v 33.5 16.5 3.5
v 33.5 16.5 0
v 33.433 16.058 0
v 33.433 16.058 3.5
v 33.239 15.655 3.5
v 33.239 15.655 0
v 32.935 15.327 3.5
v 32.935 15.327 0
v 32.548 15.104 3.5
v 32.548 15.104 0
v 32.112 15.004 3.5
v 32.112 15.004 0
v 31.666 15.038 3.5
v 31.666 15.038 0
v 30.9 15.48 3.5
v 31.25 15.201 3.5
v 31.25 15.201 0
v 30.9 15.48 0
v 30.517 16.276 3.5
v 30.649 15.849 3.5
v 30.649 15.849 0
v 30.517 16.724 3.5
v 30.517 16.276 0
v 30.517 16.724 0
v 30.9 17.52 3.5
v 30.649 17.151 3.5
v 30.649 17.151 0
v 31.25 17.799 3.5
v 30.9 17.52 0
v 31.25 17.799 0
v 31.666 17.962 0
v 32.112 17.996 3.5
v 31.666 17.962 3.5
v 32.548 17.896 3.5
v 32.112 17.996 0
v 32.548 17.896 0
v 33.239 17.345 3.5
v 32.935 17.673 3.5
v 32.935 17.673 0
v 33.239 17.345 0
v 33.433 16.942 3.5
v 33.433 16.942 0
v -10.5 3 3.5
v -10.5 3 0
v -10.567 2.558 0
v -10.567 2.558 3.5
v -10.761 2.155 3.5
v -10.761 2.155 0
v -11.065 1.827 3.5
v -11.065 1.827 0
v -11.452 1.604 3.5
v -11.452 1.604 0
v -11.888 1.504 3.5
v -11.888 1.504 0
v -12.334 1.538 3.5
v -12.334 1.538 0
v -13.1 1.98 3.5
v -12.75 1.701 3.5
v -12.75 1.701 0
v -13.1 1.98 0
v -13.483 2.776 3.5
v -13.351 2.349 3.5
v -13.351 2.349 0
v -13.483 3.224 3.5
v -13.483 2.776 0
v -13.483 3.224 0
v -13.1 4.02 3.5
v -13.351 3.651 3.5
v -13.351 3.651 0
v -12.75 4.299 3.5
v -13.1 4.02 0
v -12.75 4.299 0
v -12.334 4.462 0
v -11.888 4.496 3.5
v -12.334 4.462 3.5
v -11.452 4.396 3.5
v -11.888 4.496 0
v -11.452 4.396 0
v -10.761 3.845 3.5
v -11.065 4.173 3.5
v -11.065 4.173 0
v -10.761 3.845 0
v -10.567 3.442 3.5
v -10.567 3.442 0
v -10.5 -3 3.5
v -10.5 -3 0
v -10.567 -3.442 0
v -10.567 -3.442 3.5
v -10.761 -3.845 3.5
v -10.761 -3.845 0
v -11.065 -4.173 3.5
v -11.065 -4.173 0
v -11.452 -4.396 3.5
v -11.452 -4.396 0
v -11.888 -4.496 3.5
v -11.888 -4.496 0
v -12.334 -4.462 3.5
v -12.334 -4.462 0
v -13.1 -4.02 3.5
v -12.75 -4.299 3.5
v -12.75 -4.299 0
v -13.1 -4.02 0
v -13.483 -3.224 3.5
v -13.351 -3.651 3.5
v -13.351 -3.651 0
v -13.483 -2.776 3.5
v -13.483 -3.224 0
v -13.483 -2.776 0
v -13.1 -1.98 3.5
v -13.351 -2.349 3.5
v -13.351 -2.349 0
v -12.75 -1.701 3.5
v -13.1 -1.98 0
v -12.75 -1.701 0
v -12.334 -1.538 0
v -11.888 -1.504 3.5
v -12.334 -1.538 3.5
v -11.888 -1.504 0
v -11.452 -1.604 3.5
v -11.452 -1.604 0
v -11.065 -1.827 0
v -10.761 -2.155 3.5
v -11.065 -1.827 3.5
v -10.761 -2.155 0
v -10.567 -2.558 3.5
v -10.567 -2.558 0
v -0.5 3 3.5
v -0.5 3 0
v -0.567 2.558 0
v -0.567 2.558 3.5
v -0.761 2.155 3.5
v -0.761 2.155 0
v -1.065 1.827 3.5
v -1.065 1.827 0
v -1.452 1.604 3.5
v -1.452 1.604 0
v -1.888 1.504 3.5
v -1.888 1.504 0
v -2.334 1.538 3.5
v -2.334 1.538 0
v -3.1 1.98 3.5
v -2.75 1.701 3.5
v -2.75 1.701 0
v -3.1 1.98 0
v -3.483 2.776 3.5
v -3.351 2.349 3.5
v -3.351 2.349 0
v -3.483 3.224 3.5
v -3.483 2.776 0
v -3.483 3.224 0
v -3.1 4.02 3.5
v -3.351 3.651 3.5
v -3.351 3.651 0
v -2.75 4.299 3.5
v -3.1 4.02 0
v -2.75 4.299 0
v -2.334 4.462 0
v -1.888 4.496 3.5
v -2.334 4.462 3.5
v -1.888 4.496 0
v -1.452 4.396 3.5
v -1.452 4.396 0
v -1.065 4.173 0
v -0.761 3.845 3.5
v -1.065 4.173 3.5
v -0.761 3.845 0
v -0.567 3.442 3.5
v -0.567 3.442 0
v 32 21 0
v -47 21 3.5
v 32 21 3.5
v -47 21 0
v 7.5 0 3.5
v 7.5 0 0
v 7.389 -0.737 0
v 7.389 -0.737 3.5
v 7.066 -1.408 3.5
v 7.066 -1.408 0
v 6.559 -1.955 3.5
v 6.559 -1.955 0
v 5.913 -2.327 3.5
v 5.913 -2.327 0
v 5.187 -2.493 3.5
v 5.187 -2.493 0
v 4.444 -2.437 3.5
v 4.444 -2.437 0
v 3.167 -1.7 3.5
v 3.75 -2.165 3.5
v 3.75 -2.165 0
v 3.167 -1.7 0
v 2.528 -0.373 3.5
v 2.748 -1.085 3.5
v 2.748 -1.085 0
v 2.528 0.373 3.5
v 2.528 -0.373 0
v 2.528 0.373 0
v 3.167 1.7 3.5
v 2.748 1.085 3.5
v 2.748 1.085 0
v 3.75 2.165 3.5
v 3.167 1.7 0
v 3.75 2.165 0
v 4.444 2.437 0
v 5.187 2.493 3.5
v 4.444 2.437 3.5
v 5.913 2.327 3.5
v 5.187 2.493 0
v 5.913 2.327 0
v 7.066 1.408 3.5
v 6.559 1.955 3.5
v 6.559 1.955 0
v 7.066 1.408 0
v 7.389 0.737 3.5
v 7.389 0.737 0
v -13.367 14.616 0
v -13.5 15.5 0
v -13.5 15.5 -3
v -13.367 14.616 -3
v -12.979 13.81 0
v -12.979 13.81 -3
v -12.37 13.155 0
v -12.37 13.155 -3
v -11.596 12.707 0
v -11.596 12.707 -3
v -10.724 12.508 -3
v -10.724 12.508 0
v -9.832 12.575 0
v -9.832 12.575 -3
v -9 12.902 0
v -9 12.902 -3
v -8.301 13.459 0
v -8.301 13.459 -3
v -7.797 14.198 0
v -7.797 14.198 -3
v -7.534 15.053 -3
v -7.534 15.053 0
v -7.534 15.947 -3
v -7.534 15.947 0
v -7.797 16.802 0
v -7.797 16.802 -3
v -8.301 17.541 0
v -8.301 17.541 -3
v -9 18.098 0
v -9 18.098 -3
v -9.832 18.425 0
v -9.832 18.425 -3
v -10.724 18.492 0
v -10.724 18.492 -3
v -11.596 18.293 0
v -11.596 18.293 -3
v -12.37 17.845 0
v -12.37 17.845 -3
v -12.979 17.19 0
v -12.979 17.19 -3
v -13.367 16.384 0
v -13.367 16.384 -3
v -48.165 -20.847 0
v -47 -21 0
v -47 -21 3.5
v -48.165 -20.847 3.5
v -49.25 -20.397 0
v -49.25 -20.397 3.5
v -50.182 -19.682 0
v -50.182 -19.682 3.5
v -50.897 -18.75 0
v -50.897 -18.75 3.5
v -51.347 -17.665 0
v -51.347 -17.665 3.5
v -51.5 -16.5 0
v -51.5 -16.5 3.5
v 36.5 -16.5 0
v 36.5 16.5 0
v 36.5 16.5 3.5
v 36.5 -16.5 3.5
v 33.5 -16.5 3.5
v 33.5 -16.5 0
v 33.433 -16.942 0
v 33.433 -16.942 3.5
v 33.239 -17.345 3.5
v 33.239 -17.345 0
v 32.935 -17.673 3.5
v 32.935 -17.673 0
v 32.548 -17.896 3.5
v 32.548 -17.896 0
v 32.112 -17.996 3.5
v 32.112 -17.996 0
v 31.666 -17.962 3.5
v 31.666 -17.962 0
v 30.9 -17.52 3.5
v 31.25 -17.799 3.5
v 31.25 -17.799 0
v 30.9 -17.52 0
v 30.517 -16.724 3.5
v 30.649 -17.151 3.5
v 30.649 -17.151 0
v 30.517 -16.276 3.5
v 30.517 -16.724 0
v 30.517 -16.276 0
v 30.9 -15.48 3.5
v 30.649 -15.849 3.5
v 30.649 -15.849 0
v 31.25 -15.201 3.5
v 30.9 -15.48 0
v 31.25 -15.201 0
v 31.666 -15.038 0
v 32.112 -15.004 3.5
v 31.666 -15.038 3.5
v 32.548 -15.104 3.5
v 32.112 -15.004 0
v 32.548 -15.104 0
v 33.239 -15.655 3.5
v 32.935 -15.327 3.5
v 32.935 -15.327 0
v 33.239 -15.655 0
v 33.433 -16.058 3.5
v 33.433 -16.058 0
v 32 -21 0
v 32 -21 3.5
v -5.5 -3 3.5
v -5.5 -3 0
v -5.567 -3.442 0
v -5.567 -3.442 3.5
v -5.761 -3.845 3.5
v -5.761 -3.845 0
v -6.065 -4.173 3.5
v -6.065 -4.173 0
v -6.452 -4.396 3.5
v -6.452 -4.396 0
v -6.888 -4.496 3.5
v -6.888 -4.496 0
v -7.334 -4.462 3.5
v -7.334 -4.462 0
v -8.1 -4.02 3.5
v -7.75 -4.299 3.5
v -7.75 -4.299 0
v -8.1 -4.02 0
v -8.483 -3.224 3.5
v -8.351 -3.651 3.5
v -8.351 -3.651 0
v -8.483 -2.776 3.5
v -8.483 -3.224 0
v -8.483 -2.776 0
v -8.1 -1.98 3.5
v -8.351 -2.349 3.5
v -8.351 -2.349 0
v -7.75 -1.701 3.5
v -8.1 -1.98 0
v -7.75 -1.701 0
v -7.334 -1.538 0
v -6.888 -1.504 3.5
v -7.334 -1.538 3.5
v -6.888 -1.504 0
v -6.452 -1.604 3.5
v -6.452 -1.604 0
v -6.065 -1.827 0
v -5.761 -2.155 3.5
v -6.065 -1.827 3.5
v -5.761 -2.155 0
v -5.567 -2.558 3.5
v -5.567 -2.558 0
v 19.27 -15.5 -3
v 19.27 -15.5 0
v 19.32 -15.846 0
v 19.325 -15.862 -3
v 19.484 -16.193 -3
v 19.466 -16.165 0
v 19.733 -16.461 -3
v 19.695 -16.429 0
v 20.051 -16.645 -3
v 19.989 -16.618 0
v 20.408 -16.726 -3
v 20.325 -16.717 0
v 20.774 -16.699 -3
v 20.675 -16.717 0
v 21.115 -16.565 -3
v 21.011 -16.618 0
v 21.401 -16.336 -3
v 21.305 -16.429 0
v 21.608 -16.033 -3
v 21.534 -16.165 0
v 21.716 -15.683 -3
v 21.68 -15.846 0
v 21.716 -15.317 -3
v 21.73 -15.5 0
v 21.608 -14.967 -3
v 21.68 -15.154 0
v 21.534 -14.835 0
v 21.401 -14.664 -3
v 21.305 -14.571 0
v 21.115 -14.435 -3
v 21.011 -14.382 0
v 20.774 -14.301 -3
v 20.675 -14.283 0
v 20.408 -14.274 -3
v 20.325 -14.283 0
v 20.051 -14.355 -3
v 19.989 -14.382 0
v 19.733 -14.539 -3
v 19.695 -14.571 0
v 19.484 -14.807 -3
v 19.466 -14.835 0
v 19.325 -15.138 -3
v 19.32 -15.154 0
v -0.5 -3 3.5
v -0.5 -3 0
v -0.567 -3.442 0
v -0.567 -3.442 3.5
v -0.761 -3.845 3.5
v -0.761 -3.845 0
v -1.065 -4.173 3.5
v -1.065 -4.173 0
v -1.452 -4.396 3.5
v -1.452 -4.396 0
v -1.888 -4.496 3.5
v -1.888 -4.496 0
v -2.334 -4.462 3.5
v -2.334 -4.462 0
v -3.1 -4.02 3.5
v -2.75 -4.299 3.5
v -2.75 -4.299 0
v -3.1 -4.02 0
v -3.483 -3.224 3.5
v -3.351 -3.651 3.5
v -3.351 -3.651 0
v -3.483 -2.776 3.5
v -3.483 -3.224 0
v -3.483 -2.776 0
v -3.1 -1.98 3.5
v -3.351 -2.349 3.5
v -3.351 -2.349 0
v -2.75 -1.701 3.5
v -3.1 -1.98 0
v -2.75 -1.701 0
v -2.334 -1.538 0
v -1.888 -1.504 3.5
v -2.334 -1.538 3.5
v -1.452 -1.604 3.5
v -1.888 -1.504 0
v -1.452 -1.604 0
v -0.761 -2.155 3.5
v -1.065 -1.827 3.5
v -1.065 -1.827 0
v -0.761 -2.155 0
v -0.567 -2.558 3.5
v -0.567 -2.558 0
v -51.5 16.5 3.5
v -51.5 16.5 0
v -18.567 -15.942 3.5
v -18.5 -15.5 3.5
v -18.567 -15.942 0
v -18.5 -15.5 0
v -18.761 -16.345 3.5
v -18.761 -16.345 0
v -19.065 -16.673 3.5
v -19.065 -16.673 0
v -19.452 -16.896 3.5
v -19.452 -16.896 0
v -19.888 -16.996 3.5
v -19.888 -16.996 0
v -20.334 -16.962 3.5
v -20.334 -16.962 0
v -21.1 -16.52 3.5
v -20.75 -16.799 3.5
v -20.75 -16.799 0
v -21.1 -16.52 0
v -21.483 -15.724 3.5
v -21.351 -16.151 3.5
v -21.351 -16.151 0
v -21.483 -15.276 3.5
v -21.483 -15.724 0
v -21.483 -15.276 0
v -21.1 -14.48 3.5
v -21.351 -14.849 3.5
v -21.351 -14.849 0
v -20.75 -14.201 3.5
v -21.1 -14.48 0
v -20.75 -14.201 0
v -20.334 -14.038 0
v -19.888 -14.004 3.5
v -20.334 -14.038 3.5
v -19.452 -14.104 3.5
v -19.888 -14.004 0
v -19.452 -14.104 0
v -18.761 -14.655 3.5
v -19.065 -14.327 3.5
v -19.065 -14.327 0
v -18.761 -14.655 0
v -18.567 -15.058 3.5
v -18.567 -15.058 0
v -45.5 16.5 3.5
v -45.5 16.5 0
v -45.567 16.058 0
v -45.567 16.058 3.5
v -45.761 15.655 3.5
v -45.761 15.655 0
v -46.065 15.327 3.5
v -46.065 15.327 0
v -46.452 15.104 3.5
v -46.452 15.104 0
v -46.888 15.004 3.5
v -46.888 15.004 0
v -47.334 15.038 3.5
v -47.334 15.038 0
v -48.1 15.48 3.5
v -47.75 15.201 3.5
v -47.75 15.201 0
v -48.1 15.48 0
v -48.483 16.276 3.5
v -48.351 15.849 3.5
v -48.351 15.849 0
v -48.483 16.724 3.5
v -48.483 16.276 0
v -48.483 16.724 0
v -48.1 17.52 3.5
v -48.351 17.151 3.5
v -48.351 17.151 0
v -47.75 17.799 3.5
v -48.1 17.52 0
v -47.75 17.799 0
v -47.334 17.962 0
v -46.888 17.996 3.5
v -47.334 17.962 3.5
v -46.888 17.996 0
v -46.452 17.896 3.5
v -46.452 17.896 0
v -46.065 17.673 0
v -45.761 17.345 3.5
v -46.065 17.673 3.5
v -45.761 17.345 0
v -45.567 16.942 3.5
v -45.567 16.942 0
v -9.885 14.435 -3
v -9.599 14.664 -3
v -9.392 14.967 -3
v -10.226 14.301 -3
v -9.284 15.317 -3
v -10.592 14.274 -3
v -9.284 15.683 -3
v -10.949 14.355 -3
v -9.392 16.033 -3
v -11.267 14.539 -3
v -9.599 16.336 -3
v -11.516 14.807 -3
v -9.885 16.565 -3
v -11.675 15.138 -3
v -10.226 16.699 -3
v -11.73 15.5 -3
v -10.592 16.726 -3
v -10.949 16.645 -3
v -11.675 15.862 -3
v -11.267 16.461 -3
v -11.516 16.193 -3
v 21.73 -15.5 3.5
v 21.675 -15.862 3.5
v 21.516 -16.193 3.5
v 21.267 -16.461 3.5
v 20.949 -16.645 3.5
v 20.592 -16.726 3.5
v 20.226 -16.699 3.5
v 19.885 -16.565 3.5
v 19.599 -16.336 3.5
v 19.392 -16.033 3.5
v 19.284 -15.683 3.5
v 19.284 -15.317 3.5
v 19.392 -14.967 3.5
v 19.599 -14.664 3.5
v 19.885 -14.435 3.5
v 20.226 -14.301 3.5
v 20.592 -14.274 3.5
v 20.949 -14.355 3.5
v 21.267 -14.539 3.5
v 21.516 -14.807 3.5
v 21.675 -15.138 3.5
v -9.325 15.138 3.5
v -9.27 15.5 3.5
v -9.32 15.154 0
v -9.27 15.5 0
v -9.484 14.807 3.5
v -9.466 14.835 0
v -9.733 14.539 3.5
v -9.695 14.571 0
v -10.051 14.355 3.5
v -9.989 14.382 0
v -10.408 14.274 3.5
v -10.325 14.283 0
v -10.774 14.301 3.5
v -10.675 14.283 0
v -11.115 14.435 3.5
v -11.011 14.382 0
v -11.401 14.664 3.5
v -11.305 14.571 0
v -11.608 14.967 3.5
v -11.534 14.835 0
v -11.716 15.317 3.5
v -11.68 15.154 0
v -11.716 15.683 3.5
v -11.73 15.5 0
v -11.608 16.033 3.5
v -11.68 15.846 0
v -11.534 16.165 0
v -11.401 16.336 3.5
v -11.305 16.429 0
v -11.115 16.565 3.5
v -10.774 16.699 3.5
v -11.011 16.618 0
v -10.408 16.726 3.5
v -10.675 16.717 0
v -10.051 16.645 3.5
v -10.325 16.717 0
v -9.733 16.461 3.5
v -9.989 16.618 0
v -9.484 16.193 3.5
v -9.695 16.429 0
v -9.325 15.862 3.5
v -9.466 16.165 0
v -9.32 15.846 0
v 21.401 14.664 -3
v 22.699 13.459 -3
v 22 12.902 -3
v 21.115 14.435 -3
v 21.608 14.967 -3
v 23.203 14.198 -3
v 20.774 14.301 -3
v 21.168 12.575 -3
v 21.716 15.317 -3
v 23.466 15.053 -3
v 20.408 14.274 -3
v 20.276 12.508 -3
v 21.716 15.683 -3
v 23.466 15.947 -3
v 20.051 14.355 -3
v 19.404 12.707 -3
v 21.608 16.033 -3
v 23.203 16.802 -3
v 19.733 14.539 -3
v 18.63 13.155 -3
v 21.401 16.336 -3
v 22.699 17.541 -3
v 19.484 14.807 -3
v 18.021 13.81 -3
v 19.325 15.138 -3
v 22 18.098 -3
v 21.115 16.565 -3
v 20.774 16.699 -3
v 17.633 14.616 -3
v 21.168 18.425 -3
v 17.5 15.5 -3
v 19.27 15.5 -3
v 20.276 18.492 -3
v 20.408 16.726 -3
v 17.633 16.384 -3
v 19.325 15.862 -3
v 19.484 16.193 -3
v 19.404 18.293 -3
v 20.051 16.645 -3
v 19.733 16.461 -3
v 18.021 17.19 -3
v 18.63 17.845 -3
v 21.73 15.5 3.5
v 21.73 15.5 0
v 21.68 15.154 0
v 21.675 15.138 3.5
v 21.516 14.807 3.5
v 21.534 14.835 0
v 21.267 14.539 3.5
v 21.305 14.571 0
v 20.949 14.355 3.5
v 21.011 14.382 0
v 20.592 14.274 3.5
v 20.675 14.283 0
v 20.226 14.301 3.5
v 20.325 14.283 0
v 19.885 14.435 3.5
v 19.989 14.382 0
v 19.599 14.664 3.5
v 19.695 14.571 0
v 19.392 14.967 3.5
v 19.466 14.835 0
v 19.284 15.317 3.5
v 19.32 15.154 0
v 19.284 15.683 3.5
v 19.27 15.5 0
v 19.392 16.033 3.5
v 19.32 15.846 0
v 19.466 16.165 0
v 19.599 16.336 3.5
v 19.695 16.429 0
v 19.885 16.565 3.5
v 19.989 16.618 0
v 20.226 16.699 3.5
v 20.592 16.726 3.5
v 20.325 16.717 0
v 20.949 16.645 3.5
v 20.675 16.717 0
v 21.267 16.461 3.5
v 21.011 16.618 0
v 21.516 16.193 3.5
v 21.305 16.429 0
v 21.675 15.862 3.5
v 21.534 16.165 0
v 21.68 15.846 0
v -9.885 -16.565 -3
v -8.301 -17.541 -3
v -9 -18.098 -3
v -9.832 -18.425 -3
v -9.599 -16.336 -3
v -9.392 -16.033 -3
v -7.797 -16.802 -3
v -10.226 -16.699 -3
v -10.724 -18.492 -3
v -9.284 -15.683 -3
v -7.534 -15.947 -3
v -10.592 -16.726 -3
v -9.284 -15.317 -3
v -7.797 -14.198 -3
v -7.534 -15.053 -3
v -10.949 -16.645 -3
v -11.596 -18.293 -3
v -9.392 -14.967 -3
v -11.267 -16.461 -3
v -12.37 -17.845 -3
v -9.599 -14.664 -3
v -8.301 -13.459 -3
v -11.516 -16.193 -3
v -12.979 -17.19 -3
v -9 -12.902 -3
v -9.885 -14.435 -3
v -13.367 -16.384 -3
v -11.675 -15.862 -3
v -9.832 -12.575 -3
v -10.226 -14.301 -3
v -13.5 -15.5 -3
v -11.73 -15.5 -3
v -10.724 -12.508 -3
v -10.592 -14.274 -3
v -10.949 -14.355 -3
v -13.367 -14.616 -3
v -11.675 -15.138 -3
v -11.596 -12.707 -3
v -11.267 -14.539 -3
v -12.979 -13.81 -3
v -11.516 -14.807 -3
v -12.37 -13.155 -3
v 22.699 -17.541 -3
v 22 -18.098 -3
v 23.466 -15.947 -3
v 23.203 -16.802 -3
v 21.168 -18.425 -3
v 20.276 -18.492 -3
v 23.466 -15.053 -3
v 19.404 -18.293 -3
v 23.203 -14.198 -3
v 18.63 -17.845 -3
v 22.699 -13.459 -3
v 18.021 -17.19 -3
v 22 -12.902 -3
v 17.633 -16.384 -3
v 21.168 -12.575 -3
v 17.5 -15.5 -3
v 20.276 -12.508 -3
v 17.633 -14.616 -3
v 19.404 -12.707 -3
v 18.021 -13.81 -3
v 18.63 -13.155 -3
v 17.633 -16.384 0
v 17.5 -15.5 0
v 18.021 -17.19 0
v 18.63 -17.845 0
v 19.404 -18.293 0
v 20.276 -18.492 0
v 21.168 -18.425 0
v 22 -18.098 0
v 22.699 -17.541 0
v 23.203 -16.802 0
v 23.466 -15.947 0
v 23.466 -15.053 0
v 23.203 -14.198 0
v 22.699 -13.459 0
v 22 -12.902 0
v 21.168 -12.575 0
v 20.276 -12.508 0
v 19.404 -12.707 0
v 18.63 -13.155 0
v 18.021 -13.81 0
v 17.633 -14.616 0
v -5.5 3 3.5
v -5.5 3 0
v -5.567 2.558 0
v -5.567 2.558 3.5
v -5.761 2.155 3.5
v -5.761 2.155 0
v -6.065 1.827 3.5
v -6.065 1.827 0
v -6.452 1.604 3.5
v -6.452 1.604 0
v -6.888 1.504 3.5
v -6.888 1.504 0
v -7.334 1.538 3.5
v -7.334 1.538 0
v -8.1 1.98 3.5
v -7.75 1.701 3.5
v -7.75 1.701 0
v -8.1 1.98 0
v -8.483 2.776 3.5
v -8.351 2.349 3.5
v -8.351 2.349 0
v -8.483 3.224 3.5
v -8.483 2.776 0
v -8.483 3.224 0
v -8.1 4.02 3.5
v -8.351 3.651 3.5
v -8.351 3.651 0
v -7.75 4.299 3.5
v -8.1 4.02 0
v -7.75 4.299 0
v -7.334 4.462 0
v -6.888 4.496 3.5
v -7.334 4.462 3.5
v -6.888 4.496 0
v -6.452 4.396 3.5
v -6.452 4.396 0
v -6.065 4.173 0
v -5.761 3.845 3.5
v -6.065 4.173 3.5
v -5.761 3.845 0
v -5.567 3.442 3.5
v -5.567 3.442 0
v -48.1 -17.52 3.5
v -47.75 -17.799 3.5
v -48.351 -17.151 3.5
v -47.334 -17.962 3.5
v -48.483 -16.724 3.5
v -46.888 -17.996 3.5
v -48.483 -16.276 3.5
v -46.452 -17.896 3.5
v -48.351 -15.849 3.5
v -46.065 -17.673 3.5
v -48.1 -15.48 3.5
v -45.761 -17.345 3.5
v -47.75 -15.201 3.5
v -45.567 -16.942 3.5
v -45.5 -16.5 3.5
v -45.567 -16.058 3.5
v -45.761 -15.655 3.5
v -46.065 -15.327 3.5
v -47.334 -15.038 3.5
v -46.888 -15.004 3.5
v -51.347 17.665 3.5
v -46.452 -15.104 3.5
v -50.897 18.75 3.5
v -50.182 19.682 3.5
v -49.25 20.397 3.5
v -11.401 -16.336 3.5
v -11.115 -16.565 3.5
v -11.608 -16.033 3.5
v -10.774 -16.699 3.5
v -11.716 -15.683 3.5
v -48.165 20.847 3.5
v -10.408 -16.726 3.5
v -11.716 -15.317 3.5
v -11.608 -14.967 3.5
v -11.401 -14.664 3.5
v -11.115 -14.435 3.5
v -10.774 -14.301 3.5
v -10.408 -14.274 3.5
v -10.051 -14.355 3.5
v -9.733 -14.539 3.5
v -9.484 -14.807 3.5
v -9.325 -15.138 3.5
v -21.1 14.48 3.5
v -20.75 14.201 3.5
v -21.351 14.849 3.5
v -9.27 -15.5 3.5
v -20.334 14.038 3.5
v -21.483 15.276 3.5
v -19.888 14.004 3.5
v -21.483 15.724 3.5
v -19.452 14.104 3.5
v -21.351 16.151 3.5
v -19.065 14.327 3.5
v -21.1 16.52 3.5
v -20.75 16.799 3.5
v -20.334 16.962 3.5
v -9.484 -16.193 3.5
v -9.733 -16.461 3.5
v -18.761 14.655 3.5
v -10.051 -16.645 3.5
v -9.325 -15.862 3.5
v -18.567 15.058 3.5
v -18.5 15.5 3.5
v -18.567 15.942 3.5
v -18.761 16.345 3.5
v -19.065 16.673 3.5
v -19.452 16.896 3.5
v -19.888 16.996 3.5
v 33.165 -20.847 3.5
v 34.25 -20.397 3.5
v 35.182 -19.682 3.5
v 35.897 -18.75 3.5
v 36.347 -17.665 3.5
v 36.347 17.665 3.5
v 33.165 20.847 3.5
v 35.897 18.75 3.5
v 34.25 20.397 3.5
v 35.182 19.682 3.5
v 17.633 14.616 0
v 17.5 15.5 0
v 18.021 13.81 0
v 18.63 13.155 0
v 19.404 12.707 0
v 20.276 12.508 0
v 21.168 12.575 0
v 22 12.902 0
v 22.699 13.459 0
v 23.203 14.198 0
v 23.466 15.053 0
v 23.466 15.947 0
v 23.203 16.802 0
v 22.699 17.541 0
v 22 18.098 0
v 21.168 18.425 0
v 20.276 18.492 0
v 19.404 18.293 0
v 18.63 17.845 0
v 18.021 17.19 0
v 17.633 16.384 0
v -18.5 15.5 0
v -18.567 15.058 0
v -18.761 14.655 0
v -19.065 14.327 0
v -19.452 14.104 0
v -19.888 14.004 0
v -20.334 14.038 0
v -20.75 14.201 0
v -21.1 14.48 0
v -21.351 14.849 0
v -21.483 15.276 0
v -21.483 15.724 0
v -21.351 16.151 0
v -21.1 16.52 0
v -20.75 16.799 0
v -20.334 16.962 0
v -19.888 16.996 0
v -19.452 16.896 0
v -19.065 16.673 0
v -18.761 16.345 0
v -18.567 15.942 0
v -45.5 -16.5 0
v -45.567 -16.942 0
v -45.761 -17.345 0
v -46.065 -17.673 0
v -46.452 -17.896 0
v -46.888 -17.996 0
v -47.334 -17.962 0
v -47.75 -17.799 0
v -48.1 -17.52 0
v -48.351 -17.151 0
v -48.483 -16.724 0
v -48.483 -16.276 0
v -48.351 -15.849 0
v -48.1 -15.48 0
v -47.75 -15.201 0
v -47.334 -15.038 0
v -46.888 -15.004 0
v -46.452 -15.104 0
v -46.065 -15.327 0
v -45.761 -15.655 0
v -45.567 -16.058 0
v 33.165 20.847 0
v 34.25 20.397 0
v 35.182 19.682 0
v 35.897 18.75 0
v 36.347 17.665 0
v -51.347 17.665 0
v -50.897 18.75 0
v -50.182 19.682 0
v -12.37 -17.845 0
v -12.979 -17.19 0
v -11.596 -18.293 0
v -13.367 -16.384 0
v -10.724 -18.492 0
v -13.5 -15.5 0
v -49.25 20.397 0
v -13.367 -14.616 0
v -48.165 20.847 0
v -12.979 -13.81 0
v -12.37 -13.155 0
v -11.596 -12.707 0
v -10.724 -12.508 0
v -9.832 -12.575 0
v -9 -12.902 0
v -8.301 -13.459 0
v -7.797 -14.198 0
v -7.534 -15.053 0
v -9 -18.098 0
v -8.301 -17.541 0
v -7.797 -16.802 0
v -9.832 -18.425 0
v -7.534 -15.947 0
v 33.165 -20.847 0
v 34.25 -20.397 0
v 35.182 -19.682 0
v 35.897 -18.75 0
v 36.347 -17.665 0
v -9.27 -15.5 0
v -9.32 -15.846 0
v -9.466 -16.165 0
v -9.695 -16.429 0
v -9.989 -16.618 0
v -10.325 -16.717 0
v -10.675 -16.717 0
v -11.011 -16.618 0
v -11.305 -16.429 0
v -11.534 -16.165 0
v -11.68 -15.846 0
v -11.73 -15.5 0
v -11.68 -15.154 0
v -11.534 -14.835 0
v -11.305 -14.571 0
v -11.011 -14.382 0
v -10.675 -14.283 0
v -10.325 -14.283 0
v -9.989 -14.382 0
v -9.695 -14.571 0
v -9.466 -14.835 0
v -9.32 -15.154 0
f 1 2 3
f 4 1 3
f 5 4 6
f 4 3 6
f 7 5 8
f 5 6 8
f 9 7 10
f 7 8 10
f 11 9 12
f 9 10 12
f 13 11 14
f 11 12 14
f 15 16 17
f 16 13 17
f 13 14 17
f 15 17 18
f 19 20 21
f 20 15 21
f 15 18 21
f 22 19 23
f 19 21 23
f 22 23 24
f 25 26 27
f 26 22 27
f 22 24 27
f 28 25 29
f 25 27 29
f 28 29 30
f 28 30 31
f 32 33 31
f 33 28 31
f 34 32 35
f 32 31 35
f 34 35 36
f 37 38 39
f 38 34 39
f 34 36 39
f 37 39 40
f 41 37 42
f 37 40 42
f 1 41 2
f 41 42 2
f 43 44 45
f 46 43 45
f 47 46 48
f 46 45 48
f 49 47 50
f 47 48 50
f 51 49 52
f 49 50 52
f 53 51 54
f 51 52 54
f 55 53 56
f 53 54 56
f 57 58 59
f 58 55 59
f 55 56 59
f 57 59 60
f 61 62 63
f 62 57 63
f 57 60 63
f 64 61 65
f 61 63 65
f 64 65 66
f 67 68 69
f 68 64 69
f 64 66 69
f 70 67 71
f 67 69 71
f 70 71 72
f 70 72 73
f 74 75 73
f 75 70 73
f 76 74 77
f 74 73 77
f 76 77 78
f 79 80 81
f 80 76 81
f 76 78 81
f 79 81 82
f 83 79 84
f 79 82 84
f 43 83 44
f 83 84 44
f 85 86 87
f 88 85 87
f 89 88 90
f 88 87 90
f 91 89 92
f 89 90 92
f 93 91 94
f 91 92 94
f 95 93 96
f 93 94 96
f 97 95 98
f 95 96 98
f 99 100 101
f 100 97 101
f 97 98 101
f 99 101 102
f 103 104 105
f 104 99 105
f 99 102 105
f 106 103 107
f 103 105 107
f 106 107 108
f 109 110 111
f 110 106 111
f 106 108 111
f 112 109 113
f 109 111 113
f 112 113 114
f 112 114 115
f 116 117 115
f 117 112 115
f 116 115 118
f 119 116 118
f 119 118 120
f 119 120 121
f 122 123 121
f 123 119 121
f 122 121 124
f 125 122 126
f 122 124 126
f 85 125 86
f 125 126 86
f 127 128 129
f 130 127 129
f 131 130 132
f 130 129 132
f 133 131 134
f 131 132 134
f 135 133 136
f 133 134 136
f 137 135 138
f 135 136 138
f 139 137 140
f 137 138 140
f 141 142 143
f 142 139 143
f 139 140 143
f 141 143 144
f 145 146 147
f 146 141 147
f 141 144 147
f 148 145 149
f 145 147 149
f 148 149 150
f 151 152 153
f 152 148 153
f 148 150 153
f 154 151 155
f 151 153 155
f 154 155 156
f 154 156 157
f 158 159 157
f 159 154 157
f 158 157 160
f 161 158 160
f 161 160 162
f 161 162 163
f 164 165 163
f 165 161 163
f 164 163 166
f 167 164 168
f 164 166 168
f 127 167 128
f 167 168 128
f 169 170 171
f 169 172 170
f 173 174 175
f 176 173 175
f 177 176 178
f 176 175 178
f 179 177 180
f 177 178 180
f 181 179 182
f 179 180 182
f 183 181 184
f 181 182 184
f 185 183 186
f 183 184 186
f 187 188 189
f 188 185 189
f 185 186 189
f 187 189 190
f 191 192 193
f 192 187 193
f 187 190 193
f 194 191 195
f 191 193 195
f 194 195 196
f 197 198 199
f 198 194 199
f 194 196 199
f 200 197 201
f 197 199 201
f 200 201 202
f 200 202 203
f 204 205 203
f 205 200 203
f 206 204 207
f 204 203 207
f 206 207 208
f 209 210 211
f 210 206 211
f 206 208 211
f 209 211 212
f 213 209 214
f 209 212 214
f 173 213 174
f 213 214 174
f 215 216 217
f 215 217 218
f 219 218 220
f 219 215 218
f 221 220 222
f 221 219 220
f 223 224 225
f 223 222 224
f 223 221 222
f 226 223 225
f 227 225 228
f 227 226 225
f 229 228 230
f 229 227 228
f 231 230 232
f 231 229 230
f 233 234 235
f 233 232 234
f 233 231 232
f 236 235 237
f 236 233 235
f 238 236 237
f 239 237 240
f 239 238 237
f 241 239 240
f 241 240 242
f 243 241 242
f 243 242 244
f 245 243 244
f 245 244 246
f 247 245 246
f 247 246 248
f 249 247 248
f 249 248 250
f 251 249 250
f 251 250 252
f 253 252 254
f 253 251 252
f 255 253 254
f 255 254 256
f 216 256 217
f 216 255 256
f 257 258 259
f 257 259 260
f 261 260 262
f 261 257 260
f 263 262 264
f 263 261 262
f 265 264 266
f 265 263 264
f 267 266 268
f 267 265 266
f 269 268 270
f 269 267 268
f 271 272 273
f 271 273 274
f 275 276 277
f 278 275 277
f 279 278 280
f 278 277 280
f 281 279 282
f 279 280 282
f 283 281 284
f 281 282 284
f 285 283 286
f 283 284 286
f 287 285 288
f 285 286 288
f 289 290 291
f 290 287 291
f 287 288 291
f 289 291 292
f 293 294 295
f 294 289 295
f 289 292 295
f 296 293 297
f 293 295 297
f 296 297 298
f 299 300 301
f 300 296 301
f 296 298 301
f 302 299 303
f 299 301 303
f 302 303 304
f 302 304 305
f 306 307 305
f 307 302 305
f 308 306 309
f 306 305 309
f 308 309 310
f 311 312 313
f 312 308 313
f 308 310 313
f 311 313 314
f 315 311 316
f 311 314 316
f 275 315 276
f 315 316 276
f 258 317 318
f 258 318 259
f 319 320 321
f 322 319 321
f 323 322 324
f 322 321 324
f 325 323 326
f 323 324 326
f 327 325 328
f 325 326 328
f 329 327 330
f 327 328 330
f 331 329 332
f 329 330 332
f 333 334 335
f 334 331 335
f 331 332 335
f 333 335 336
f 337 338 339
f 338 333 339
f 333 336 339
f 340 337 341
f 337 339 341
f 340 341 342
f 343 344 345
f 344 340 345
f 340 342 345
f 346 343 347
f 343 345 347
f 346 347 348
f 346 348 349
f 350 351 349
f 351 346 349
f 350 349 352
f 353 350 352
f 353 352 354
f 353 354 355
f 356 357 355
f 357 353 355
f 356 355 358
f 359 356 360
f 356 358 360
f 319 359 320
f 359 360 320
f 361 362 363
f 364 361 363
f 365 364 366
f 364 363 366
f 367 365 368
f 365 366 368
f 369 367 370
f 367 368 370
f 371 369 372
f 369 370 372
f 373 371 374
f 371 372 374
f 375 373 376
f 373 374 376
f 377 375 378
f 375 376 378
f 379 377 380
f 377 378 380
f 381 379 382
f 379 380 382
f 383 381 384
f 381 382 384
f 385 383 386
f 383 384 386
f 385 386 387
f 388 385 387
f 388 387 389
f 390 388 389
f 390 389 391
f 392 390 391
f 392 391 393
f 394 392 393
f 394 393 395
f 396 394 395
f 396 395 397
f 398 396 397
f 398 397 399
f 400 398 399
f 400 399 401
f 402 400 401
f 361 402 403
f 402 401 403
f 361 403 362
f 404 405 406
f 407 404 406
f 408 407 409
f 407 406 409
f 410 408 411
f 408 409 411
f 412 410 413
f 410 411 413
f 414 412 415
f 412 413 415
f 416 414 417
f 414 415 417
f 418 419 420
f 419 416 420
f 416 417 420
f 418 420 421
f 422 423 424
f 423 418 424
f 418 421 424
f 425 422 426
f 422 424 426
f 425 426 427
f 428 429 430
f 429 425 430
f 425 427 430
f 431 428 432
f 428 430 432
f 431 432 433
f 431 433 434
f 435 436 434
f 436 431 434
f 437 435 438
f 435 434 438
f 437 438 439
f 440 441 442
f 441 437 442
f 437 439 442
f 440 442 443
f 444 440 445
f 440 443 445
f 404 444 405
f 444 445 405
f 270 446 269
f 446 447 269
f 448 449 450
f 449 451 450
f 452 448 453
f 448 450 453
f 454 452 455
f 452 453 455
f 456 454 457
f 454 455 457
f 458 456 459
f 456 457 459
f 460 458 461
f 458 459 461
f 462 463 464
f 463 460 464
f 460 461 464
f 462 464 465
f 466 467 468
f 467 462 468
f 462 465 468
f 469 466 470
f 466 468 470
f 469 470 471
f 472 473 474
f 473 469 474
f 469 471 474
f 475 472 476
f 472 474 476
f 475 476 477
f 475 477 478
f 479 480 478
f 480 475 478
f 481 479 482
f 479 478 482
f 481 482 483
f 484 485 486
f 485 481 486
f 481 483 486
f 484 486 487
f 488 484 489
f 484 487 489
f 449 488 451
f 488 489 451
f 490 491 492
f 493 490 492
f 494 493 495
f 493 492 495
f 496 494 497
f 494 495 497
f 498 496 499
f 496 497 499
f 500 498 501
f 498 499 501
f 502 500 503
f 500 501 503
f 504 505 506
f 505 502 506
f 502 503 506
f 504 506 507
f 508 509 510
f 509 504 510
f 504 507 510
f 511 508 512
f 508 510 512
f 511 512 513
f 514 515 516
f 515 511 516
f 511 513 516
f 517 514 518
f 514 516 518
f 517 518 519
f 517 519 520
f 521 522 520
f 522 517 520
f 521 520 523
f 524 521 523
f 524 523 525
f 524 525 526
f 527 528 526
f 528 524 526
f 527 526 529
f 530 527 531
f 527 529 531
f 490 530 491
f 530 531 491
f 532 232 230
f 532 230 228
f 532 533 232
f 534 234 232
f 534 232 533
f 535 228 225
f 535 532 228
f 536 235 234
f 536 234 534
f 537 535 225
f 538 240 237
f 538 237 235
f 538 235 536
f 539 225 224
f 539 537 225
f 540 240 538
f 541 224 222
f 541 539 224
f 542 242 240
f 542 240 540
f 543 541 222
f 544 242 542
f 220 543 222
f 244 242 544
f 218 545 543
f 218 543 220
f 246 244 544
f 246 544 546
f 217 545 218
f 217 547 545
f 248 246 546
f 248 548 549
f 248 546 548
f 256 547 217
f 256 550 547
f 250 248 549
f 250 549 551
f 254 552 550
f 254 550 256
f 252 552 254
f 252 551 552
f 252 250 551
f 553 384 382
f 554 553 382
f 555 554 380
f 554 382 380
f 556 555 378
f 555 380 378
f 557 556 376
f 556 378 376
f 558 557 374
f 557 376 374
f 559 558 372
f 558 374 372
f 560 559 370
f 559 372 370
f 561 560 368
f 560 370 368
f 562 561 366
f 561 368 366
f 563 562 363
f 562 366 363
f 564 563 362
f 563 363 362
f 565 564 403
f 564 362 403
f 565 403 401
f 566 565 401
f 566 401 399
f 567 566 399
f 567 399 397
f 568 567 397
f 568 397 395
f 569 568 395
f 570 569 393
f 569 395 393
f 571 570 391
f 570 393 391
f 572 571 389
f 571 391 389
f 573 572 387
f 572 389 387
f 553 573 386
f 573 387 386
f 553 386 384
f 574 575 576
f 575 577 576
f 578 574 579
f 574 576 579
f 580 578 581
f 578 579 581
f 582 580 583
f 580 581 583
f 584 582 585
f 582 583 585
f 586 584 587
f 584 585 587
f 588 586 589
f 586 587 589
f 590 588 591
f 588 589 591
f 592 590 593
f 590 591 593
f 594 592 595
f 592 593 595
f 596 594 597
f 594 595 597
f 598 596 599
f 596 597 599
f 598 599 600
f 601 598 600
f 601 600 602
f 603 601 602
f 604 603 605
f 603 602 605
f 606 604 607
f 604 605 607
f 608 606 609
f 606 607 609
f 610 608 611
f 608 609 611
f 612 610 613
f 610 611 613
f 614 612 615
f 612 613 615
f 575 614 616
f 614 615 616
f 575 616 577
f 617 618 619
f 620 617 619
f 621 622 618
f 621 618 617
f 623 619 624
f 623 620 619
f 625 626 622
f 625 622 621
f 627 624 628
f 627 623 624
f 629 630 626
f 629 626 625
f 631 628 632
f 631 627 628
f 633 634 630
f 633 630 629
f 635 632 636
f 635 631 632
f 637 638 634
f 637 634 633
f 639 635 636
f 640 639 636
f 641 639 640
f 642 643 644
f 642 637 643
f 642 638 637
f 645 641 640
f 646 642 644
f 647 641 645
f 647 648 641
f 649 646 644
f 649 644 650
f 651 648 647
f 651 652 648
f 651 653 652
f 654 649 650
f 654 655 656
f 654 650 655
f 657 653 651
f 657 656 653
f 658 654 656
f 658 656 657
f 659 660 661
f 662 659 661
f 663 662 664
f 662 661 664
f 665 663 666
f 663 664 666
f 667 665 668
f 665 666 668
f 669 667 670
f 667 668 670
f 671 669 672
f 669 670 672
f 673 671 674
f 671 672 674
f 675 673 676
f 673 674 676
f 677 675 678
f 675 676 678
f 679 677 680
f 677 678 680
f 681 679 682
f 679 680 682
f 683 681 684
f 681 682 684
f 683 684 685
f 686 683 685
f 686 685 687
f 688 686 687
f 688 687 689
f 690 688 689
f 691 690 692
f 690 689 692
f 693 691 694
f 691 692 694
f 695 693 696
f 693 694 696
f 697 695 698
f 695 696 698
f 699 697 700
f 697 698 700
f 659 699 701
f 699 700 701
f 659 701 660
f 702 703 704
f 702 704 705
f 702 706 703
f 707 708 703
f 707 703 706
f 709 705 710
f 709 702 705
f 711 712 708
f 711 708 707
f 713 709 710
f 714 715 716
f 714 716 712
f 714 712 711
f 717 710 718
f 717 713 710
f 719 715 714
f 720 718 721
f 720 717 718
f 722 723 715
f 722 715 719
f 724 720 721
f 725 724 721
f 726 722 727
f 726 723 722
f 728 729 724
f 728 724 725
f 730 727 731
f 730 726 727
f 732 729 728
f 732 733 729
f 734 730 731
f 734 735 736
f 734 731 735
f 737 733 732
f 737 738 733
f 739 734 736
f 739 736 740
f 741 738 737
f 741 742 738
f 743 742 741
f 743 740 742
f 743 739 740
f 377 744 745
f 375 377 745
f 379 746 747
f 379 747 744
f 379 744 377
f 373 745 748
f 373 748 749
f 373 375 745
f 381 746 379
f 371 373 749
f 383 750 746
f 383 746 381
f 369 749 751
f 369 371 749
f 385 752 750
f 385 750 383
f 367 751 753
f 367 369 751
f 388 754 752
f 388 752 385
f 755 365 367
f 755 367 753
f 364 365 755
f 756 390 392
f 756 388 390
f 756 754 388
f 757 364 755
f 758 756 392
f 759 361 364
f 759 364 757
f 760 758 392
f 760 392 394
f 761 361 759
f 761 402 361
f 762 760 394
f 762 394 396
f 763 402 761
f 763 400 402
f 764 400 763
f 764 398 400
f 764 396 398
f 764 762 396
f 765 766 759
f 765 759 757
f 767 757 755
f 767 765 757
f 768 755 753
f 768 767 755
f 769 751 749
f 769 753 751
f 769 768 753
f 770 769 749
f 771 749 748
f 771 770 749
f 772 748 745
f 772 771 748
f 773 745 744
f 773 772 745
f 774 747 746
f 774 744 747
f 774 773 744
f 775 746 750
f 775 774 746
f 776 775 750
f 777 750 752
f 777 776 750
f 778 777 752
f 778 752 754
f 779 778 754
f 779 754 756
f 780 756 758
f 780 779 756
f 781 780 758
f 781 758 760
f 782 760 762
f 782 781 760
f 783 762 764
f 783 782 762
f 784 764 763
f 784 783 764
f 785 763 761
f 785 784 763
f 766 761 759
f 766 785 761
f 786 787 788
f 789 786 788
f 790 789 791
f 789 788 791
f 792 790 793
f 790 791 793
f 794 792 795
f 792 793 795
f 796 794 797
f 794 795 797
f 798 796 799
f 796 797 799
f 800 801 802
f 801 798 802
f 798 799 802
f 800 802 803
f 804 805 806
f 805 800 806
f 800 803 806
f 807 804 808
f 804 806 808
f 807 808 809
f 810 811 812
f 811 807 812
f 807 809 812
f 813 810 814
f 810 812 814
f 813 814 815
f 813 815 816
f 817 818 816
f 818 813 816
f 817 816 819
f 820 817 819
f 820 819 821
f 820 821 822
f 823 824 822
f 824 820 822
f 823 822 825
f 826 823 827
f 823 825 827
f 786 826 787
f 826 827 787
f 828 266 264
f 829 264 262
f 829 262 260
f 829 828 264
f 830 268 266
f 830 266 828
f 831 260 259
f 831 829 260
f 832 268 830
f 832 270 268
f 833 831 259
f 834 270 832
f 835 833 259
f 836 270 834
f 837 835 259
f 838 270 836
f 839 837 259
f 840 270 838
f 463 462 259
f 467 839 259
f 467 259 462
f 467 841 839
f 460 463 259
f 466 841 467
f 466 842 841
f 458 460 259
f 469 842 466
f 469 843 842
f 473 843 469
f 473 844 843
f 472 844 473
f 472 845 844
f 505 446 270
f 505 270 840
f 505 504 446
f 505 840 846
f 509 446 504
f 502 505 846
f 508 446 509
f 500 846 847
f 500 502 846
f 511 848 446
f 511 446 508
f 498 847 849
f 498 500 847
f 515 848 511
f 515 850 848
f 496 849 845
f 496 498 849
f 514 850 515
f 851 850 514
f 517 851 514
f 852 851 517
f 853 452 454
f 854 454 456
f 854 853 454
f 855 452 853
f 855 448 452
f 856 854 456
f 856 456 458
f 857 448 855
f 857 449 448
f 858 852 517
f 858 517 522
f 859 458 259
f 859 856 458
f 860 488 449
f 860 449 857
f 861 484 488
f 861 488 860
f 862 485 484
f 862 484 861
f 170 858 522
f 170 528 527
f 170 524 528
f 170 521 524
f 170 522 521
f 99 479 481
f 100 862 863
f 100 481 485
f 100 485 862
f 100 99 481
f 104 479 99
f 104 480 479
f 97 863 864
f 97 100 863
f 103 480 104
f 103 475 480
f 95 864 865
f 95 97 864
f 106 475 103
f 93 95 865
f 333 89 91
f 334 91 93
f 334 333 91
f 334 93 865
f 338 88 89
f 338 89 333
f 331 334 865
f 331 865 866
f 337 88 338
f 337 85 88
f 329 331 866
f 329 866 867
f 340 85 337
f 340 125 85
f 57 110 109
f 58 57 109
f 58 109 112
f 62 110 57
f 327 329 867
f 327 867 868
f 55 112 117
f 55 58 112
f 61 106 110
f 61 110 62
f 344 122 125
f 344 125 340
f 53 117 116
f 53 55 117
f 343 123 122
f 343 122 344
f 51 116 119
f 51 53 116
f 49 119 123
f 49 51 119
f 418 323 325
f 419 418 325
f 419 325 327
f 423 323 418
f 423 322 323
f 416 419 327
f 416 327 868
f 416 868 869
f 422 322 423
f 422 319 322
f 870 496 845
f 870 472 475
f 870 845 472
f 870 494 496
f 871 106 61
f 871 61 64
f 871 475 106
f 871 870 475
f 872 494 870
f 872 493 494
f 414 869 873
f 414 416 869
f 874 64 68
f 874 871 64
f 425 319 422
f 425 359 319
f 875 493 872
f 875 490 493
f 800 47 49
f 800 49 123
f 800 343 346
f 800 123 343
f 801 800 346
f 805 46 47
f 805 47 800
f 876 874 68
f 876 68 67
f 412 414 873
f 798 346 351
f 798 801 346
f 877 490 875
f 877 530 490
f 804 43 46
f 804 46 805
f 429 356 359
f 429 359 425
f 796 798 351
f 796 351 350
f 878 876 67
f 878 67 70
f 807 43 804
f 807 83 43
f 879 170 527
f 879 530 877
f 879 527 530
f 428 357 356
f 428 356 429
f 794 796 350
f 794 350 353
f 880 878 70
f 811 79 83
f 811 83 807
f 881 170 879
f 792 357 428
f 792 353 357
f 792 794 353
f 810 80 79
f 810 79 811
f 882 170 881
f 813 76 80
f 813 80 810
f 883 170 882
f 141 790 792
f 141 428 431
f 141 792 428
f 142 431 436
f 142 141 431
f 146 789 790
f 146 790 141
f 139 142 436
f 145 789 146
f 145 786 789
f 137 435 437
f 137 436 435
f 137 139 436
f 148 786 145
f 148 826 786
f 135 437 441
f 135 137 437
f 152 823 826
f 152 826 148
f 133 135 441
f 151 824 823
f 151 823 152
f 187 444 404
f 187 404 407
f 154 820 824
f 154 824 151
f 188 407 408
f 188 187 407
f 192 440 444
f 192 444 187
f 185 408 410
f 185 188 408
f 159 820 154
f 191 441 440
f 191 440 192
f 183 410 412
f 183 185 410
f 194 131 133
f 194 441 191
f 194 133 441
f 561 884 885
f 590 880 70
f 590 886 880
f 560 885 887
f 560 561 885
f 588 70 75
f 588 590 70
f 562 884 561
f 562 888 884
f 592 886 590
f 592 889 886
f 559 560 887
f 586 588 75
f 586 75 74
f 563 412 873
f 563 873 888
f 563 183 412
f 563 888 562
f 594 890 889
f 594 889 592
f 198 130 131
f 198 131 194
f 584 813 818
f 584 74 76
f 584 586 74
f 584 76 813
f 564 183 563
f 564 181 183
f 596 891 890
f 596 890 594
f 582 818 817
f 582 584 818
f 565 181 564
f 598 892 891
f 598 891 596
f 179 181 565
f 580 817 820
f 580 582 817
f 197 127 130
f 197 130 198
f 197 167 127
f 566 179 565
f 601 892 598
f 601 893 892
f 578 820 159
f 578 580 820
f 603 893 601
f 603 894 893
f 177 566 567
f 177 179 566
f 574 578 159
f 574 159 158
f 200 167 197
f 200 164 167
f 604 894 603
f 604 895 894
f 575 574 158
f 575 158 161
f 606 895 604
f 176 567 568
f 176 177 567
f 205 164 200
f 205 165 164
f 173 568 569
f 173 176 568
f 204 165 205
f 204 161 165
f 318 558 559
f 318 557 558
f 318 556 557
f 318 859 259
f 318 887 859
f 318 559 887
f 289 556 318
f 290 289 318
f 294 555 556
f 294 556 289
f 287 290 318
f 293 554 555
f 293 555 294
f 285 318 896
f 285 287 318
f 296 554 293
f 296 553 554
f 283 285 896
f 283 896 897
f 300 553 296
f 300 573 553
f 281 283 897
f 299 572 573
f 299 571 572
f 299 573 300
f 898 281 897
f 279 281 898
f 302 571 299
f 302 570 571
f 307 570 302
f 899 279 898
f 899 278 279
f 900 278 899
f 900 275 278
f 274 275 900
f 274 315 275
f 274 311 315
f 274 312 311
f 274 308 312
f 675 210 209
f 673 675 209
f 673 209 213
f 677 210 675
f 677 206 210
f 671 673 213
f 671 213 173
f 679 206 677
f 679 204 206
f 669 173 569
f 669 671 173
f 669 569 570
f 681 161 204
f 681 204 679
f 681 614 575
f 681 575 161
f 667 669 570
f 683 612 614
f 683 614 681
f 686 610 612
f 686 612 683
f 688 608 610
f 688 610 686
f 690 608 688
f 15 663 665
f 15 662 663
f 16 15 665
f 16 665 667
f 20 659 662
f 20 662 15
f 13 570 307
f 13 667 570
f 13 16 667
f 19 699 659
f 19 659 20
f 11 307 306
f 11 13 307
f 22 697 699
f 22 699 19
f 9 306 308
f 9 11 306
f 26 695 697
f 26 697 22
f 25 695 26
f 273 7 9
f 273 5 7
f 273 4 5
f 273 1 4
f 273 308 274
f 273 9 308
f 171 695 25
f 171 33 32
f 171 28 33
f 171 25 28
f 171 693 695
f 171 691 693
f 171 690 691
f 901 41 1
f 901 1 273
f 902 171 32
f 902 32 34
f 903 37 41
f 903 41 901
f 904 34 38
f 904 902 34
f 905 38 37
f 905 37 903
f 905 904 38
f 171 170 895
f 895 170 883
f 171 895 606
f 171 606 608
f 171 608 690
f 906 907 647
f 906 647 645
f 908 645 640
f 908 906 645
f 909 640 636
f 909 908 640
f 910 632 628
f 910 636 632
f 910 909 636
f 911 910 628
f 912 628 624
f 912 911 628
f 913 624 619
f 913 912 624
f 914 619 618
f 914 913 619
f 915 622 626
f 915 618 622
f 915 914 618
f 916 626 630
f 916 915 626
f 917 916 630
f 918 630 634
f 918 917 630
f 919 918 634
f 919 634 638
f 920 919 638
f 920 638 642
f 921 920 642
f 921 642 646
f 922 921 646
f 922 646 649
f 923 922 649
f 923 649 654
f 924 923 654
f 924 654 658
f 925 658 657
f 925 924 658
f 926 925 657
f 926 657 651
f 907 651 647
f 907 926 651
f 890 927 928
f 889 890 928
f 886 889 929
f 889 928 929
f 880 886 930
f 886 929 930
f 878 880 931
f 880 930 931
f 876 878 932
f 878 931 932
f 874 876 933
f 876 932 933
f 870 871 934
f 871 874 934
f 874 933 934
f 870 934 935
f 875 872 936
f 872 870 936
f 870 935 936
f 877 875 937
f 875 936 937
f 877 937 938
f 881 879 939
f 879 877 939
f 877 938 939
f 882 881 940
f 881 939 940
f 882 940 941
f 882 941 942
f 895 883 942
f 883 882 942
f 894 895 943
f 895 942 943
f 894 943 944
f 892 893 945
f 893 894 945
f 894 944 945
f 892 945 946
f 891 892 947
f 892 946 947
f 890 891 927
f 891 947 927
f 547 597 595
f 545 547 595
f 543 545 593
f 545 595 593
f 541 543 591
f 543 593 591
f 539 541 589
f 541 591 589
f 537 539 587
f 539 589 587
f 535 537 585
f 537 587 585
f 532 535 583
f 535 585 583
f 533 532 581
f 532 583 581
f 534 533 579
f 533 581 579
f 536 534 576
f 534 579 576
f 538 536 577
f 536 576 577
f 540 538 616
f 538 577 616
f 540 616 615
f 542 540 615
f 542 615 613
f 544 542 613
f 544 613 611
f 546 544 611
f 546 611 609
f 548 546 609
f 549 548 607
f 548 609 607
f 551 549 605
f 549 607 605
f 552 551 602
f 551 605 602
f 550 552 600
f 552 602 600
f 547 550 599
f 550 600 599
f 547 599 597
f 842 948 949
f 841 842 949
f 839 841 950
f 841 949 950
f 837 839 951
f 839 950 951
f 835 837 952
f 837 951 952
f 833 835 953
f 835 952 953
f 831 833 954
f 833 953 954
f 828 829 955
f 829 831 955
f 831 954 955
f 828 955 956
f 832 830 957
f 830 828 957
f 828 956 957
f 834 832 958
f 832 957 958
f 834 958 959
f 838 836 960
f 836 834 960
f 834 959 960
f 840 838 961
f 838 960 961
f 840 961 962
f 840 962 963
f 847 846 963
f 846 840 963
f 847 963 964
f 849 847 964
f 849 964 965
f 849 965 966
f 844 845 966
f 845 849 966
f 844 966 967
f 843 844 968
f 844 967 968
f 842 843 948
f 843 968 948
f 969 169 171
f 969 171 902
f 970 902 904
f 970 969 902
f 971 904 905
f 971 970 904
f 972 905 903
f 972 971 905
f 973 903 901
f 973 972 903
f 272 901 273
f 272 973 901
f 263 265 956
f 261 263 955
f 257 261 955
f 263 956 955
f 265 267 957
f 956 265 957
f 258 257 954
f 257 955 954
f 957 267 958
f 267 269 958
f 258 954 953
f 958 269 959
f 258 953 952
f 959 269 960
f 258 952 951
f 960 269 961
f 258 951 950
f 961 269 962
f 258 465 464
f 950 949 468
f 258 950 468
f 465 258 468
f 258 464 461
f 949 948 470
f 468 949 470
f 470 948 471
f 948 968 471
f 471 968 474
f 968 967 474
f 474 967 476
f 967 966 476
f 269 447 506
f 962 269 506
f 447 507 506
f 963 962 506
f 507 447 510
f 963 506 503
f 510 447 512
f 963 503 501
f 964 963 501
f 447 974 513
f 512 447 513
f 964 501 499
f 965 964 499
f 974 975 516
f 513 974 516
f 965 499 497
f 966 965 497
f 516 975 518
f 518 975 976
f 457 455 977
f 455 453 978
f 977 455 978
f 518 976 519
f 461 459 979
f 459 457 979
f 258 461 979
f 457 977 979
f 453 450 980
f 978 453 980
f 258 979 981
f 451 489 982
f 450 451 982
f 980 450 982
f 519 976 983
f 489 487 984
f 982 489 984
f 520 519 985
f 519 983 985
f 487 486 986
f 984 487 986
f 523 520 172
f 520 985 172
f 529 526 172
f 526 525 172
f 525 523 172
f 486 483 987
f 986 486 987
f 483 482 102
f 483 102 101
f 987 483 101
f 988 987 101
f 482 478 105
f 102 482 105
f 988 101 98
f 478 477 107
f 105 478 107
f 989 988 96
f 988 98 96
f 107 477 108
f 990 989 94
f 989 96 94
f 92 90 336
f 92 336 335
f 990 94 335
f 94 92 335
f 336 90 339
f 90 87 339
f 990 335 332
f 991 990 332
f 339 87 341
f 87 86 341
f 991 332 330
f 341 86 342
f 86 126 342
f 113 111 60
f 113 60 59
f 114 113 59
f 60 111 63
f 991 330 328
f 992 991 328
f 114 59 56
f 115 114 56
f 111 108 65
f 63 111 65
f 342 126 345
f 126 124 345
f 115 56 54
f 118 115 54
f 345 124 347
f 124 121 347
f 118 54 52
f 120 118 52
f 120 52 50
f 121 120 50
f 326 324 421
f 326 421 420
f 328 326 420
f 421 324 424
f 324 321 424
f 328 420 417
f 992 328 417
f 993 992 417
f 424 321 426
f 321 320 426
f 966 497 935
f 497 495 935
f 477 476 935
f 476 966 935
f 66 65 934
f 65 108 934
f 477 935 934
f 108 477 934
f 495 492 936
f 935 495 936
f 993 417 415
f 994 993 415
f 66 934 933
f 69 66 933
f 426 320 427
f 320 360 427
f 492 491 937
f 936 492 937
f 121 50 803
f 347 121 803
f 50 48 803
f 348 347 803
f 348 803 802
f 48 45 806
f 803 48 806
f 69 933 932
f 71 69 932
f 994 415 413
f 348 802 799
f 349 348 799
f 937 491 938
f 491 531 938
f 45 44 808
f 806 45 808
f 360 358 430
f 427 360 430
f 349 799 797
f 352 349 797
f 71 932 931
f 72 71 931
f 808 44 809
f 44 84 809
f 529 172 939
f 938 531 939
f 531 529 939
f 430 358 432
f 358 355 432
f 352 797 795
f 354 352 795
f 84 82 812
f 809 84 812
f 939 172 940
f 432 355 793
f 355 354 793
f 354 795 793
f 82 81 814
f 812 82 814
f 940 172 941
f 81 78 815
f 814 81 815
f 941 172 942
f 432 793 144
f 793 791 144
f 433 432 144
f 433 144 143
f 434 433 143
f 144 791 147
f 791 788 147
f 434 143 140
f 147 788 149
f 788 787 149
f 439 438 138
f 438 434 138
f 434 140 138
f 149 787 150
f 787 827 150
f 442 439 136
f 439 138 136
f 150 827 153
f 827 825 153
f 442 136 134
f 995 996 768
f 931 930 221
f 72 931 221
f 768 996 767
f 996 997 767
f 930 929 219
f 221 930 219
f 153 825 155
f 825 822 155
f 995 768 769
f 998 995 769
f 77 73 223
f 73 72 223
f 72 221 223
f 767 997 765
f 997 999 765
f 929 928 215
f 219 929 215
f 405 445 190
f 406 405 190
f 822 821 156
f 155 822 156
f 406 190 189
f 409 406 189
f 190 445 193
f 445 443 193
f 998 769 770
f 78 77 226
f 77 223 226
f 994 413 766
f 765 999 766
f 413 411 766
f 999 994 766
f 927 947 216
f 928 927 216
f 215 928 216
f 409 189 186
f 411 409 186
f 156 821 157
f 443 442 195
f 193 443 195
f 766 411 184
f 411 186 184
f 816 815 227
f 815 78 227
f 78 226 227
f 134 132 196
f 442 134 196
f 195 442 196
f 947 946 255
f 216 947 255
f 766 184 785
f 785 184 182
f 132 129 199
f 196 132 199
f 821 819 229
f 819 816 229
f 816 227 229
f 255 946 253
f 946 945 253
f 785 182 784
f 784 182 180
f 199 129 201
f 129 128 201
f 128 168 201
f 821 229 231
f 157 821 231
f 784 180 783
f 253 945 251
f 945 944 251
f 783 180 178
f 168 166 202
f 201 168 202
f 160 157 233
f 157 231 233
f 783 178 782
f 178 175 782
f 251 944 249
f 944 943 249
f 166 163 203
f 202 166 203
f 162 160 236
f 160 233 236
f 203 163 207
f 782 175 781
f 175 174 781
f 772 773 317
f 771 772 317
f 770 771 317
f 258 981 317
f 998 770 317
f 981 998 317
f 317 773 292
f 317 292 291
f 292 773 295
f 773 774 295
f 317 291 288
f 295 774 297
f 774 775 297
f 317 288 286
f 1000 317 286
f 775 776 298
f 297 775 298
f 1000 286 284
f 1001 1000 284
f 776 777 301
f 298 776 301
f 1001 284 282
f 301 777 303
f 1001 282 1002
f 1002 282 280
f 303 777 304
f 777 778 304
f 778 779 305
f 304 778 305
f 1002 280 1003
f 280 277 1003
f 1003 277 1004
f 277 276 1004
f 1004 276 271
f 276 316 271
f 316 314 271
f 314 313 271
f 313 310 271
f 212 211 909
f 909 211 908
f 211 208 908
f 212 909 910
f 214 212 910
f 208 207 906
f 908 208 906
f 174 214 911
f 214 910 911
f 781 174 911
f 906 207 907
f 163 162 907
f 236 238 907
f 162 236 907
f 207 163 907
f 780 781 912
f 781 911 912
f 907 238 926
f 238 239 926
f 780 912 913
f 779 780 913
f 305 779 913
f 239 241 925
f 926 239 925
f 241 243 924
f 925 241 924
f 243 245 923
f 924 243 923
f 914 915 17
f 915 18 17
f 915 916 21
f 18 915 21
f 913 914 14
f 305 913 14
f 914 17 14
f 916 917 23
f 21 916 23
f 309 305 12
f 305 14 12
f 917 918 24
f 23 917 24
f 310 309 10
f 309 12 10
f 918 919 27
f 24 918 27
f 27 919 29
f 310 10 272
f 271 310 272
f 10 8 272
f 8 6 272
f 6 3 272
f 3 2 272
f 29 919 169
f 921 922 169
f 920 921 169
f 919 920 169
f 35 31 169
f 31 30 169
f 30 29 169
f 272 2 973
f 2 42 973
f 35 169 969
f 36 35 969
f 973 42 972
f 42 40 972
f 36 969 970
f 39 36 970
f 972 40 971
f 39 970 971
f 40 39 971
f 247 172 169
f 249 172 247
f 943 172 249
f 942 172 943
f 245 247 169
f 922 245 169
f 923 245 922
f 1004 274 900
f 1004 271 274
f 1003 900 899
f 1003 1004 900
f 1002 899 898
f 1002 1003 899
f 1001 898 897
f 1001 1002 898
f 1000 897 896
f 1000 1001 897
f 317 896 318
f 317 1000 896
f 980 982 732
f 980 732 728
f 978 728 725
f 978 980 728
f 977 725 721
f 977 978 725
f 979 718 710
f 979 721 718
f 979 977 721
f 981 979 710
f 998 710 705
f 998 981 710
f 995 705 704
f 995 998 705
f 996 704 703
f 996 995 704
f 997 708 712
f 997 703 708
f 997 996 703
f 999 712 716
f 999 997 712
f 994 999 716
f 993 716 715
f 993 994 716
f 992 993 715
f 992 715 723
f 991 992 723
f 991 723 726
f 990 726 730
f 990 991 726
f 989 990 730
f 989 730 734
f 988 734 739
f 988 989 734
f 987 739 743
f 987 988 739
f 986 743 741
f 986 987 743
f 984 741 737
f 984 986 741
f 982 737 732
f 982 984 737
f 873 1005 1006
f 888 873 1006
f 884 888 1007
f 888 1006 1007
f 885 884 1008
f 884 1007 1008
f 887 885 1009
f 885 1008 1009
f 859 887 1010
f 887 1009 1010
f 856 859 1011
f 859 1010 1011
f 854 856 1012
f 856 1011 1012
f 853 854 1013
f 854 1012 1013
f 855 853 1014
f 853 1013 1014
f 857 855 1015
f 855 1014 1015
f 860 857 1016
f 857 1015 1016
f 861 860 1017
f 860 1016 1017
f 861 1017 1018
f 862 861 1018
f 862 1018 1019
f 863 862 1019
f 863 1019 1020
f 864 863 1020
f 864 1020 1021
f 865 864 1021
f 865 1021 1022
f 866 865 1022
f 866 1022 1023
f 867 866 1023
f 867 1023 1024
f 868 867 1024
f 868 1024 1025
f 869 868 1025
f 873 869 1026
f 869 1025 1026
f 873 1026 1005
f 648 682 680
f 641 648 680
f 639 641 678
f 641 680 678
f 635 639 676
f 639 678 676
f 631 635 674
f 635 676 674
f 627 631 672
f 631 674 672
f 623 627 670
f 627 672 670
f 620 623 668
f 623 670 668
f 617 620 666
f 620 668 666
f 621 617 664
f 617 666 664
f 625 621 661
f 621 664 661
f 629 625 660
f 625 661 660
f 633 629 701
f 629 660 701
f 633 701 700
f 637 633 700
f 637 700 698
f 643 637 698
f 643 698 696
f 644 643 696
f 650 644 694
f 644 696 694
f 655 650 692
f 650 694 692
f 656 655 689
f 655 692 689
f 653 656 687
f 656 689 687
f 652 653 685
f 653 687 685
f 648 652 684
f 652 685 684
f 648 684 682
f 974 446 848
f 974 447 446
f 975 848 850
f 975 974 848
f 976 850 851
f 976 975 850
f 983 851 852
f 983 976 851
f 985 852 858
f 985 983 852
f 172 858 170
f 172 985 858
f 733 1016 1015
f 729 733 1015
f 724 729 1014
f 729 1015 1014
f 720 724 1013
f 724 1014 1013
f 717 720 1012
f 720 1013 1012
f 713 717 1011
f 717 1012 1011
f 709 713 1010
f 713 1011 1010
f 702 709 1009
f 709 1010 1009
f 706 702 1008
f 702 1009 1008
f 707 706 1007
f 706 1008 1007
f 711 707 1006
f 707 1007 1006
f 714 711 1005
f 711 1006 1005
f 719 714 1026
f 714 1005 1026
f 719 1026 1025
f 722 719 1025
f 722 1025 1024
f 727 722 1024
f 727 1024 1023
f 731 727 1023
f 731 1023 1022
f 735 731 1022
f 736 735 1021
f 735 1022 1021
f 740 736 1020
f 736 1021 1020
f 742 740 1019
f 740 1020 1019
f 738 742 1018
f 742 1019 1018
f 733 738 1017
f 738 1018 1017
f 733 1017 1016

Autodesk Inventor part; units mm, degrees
ref_plane "YZ Plane" through (0, 0, 0) normal (1, 0, 0) x (0, 1, 0)
ref_plane "XZ Plane" through (0, 0, 0) normal (0, 1, 0) x (-1, 0, 0)
ref_plane "XY Plane" through (0, 0, 0) normal (0, 0, 1) x (1, 0, 0)
sketch "Sketch1" plane through (0, 0, 0) normal (0, 0, 1) x (1, 0, 0)
  line L0 (21.5, 21) -> (-21.5, 21) projected
  arc A0 (-21.5, 21) -> (-26, 16.5) centre (-21.5, 16.5) ccw construction
  line L1 (-26, 16.5) -> (-26, -16.5) construction
  arc A1 (-26, -16.5) -> (-21.5, -21) centre (-21.5, -16.5) ccw construction
  line L2 (-21.5, -21) -> (21.5, -21) projected
  arc A2 (21.5, -21) -> (26, -16.5) centre (21.5, -16.5) ccw construction
  line L3 (26, -16.5) -> (26, 16.5) construction
  arc A3 (26, 16.5) -> (21.5, 21) centre (21.5, 16.5) ccw construction
  circle A4 centre (5, 0) radius 2.5 projected
  circle A5 centre (-20, 15.5) radius 1.5 projected
  circle A6 centre (-10.5, -15.5) radius 1.2295 projected
  circle A7 centre (-10.5, 15.5) radius 1.2295 projected
  circle A8 centre (-2, 3) radius 1.5 projected
  circle A9 centre (-2, -3) radius 1.5 projected
  circle A10 centre (-7, 3) radius 1.5 projected
  circle A11 centre (-7, -3) radius 1.5 projected
  circle A12 centre (-12, 3) radius 1.5 projected
  circle A13 centre (-12, -3) radius 1.5 projected
  circle A14 centre (-20, -15.5) radius 1.5 projected
  circle A15 centre (20.5, -15.5) radius 1.2295 projected
  circle A16 centre (20.5, 15.5) radius 1.2295 projected
  line L4 (-21.5, 21) -> (-47, 21)
  line L5 (-51.5, 16.5) -> (-51.5, -16.5)
  line L6 (-47, -21) -> (-21.5, -21)
  arc A17 (-47, 21) -> (-51.5, 16.5) centre (-47, 16.5) ccw
  arc A18 (-51.5, -16.5) -> (-47, -21) centre (-47, -16.5) ccw
  circle A19 centre (-47, -16.5) radius 1.5
  circle A20 centre (-47, 16.5) radius 1.5
  line L7 (21.5, 21) -> (32, 21)
  line L8 (36.5, 16.5) -> (36.5, -16.5)
  line L9 (32, -21) -> (21.5, -21)
  arc A21 (36.5, 16.5) -> (32, 21) centre (32, 16.5) ccw
  arc A22 (32, -21) -> (36.5, -16.5) centre (32, -16.5) ccw
  circle A23 centre (32, 16.5) radius 1.5
  circle A24 centre (32, -16.5) radius 1.5
  point P0 (0, 0)
  point P1 (-51.5, 21)
  point P2 (36.5, 21)
  dimension "d0" = 30
  dimension "d1" = 4.5
  dimension "d2" = 3
  dimension "d3" = 3
  dimension "d13" = 15
  dimension "d14" = 4.5
  dimension "d15" = 3
  dimension "d16" = 3
extrude "Extrusion1" add sketch "Sketch1" along normal blind 3.5
ref_plane "Work Plane1" through (0, 0, 10.75) normal (0, 0, -1) x (-1, 0, 0)
sketch "Sketch2" plane through (0, 0, 0) normal (0, 0, -1) x (-1, 0, 0)
  circle A0 centre (-20.5, 15.5) radius 1.2295 projected
  circle A1 centre (-20.5, 15.5) radius 3
  circle A2 centre (10.5, 15.5) radius 1.2295 projected
  circle A3 centre (10.5, 15.5) radius 3
  circle A4 centre (-20.5, -15.5) radius 1.2295 projected
  circle A5 centre (-20.5, -15.5) radius 3
  circle A6 centre (10.5, -15.5) radius 1.2295 projected
  circle A7 centre (10.5, -15.5) radius 3
  point P0 (0, 0)
  dimension "d7" = 6
  dimension "d8" = 6
  dimension "d9" = 6
  dimension "d10" = 6
extrude "Extrusion2" add sketch "Sketch2" along normal blind 3
equation "\"d7\" = d8"
equation "\"d9\" = d8"
equation "\"d10\" = d8"
properties part number "housingBack" material "ABS Plastic"
